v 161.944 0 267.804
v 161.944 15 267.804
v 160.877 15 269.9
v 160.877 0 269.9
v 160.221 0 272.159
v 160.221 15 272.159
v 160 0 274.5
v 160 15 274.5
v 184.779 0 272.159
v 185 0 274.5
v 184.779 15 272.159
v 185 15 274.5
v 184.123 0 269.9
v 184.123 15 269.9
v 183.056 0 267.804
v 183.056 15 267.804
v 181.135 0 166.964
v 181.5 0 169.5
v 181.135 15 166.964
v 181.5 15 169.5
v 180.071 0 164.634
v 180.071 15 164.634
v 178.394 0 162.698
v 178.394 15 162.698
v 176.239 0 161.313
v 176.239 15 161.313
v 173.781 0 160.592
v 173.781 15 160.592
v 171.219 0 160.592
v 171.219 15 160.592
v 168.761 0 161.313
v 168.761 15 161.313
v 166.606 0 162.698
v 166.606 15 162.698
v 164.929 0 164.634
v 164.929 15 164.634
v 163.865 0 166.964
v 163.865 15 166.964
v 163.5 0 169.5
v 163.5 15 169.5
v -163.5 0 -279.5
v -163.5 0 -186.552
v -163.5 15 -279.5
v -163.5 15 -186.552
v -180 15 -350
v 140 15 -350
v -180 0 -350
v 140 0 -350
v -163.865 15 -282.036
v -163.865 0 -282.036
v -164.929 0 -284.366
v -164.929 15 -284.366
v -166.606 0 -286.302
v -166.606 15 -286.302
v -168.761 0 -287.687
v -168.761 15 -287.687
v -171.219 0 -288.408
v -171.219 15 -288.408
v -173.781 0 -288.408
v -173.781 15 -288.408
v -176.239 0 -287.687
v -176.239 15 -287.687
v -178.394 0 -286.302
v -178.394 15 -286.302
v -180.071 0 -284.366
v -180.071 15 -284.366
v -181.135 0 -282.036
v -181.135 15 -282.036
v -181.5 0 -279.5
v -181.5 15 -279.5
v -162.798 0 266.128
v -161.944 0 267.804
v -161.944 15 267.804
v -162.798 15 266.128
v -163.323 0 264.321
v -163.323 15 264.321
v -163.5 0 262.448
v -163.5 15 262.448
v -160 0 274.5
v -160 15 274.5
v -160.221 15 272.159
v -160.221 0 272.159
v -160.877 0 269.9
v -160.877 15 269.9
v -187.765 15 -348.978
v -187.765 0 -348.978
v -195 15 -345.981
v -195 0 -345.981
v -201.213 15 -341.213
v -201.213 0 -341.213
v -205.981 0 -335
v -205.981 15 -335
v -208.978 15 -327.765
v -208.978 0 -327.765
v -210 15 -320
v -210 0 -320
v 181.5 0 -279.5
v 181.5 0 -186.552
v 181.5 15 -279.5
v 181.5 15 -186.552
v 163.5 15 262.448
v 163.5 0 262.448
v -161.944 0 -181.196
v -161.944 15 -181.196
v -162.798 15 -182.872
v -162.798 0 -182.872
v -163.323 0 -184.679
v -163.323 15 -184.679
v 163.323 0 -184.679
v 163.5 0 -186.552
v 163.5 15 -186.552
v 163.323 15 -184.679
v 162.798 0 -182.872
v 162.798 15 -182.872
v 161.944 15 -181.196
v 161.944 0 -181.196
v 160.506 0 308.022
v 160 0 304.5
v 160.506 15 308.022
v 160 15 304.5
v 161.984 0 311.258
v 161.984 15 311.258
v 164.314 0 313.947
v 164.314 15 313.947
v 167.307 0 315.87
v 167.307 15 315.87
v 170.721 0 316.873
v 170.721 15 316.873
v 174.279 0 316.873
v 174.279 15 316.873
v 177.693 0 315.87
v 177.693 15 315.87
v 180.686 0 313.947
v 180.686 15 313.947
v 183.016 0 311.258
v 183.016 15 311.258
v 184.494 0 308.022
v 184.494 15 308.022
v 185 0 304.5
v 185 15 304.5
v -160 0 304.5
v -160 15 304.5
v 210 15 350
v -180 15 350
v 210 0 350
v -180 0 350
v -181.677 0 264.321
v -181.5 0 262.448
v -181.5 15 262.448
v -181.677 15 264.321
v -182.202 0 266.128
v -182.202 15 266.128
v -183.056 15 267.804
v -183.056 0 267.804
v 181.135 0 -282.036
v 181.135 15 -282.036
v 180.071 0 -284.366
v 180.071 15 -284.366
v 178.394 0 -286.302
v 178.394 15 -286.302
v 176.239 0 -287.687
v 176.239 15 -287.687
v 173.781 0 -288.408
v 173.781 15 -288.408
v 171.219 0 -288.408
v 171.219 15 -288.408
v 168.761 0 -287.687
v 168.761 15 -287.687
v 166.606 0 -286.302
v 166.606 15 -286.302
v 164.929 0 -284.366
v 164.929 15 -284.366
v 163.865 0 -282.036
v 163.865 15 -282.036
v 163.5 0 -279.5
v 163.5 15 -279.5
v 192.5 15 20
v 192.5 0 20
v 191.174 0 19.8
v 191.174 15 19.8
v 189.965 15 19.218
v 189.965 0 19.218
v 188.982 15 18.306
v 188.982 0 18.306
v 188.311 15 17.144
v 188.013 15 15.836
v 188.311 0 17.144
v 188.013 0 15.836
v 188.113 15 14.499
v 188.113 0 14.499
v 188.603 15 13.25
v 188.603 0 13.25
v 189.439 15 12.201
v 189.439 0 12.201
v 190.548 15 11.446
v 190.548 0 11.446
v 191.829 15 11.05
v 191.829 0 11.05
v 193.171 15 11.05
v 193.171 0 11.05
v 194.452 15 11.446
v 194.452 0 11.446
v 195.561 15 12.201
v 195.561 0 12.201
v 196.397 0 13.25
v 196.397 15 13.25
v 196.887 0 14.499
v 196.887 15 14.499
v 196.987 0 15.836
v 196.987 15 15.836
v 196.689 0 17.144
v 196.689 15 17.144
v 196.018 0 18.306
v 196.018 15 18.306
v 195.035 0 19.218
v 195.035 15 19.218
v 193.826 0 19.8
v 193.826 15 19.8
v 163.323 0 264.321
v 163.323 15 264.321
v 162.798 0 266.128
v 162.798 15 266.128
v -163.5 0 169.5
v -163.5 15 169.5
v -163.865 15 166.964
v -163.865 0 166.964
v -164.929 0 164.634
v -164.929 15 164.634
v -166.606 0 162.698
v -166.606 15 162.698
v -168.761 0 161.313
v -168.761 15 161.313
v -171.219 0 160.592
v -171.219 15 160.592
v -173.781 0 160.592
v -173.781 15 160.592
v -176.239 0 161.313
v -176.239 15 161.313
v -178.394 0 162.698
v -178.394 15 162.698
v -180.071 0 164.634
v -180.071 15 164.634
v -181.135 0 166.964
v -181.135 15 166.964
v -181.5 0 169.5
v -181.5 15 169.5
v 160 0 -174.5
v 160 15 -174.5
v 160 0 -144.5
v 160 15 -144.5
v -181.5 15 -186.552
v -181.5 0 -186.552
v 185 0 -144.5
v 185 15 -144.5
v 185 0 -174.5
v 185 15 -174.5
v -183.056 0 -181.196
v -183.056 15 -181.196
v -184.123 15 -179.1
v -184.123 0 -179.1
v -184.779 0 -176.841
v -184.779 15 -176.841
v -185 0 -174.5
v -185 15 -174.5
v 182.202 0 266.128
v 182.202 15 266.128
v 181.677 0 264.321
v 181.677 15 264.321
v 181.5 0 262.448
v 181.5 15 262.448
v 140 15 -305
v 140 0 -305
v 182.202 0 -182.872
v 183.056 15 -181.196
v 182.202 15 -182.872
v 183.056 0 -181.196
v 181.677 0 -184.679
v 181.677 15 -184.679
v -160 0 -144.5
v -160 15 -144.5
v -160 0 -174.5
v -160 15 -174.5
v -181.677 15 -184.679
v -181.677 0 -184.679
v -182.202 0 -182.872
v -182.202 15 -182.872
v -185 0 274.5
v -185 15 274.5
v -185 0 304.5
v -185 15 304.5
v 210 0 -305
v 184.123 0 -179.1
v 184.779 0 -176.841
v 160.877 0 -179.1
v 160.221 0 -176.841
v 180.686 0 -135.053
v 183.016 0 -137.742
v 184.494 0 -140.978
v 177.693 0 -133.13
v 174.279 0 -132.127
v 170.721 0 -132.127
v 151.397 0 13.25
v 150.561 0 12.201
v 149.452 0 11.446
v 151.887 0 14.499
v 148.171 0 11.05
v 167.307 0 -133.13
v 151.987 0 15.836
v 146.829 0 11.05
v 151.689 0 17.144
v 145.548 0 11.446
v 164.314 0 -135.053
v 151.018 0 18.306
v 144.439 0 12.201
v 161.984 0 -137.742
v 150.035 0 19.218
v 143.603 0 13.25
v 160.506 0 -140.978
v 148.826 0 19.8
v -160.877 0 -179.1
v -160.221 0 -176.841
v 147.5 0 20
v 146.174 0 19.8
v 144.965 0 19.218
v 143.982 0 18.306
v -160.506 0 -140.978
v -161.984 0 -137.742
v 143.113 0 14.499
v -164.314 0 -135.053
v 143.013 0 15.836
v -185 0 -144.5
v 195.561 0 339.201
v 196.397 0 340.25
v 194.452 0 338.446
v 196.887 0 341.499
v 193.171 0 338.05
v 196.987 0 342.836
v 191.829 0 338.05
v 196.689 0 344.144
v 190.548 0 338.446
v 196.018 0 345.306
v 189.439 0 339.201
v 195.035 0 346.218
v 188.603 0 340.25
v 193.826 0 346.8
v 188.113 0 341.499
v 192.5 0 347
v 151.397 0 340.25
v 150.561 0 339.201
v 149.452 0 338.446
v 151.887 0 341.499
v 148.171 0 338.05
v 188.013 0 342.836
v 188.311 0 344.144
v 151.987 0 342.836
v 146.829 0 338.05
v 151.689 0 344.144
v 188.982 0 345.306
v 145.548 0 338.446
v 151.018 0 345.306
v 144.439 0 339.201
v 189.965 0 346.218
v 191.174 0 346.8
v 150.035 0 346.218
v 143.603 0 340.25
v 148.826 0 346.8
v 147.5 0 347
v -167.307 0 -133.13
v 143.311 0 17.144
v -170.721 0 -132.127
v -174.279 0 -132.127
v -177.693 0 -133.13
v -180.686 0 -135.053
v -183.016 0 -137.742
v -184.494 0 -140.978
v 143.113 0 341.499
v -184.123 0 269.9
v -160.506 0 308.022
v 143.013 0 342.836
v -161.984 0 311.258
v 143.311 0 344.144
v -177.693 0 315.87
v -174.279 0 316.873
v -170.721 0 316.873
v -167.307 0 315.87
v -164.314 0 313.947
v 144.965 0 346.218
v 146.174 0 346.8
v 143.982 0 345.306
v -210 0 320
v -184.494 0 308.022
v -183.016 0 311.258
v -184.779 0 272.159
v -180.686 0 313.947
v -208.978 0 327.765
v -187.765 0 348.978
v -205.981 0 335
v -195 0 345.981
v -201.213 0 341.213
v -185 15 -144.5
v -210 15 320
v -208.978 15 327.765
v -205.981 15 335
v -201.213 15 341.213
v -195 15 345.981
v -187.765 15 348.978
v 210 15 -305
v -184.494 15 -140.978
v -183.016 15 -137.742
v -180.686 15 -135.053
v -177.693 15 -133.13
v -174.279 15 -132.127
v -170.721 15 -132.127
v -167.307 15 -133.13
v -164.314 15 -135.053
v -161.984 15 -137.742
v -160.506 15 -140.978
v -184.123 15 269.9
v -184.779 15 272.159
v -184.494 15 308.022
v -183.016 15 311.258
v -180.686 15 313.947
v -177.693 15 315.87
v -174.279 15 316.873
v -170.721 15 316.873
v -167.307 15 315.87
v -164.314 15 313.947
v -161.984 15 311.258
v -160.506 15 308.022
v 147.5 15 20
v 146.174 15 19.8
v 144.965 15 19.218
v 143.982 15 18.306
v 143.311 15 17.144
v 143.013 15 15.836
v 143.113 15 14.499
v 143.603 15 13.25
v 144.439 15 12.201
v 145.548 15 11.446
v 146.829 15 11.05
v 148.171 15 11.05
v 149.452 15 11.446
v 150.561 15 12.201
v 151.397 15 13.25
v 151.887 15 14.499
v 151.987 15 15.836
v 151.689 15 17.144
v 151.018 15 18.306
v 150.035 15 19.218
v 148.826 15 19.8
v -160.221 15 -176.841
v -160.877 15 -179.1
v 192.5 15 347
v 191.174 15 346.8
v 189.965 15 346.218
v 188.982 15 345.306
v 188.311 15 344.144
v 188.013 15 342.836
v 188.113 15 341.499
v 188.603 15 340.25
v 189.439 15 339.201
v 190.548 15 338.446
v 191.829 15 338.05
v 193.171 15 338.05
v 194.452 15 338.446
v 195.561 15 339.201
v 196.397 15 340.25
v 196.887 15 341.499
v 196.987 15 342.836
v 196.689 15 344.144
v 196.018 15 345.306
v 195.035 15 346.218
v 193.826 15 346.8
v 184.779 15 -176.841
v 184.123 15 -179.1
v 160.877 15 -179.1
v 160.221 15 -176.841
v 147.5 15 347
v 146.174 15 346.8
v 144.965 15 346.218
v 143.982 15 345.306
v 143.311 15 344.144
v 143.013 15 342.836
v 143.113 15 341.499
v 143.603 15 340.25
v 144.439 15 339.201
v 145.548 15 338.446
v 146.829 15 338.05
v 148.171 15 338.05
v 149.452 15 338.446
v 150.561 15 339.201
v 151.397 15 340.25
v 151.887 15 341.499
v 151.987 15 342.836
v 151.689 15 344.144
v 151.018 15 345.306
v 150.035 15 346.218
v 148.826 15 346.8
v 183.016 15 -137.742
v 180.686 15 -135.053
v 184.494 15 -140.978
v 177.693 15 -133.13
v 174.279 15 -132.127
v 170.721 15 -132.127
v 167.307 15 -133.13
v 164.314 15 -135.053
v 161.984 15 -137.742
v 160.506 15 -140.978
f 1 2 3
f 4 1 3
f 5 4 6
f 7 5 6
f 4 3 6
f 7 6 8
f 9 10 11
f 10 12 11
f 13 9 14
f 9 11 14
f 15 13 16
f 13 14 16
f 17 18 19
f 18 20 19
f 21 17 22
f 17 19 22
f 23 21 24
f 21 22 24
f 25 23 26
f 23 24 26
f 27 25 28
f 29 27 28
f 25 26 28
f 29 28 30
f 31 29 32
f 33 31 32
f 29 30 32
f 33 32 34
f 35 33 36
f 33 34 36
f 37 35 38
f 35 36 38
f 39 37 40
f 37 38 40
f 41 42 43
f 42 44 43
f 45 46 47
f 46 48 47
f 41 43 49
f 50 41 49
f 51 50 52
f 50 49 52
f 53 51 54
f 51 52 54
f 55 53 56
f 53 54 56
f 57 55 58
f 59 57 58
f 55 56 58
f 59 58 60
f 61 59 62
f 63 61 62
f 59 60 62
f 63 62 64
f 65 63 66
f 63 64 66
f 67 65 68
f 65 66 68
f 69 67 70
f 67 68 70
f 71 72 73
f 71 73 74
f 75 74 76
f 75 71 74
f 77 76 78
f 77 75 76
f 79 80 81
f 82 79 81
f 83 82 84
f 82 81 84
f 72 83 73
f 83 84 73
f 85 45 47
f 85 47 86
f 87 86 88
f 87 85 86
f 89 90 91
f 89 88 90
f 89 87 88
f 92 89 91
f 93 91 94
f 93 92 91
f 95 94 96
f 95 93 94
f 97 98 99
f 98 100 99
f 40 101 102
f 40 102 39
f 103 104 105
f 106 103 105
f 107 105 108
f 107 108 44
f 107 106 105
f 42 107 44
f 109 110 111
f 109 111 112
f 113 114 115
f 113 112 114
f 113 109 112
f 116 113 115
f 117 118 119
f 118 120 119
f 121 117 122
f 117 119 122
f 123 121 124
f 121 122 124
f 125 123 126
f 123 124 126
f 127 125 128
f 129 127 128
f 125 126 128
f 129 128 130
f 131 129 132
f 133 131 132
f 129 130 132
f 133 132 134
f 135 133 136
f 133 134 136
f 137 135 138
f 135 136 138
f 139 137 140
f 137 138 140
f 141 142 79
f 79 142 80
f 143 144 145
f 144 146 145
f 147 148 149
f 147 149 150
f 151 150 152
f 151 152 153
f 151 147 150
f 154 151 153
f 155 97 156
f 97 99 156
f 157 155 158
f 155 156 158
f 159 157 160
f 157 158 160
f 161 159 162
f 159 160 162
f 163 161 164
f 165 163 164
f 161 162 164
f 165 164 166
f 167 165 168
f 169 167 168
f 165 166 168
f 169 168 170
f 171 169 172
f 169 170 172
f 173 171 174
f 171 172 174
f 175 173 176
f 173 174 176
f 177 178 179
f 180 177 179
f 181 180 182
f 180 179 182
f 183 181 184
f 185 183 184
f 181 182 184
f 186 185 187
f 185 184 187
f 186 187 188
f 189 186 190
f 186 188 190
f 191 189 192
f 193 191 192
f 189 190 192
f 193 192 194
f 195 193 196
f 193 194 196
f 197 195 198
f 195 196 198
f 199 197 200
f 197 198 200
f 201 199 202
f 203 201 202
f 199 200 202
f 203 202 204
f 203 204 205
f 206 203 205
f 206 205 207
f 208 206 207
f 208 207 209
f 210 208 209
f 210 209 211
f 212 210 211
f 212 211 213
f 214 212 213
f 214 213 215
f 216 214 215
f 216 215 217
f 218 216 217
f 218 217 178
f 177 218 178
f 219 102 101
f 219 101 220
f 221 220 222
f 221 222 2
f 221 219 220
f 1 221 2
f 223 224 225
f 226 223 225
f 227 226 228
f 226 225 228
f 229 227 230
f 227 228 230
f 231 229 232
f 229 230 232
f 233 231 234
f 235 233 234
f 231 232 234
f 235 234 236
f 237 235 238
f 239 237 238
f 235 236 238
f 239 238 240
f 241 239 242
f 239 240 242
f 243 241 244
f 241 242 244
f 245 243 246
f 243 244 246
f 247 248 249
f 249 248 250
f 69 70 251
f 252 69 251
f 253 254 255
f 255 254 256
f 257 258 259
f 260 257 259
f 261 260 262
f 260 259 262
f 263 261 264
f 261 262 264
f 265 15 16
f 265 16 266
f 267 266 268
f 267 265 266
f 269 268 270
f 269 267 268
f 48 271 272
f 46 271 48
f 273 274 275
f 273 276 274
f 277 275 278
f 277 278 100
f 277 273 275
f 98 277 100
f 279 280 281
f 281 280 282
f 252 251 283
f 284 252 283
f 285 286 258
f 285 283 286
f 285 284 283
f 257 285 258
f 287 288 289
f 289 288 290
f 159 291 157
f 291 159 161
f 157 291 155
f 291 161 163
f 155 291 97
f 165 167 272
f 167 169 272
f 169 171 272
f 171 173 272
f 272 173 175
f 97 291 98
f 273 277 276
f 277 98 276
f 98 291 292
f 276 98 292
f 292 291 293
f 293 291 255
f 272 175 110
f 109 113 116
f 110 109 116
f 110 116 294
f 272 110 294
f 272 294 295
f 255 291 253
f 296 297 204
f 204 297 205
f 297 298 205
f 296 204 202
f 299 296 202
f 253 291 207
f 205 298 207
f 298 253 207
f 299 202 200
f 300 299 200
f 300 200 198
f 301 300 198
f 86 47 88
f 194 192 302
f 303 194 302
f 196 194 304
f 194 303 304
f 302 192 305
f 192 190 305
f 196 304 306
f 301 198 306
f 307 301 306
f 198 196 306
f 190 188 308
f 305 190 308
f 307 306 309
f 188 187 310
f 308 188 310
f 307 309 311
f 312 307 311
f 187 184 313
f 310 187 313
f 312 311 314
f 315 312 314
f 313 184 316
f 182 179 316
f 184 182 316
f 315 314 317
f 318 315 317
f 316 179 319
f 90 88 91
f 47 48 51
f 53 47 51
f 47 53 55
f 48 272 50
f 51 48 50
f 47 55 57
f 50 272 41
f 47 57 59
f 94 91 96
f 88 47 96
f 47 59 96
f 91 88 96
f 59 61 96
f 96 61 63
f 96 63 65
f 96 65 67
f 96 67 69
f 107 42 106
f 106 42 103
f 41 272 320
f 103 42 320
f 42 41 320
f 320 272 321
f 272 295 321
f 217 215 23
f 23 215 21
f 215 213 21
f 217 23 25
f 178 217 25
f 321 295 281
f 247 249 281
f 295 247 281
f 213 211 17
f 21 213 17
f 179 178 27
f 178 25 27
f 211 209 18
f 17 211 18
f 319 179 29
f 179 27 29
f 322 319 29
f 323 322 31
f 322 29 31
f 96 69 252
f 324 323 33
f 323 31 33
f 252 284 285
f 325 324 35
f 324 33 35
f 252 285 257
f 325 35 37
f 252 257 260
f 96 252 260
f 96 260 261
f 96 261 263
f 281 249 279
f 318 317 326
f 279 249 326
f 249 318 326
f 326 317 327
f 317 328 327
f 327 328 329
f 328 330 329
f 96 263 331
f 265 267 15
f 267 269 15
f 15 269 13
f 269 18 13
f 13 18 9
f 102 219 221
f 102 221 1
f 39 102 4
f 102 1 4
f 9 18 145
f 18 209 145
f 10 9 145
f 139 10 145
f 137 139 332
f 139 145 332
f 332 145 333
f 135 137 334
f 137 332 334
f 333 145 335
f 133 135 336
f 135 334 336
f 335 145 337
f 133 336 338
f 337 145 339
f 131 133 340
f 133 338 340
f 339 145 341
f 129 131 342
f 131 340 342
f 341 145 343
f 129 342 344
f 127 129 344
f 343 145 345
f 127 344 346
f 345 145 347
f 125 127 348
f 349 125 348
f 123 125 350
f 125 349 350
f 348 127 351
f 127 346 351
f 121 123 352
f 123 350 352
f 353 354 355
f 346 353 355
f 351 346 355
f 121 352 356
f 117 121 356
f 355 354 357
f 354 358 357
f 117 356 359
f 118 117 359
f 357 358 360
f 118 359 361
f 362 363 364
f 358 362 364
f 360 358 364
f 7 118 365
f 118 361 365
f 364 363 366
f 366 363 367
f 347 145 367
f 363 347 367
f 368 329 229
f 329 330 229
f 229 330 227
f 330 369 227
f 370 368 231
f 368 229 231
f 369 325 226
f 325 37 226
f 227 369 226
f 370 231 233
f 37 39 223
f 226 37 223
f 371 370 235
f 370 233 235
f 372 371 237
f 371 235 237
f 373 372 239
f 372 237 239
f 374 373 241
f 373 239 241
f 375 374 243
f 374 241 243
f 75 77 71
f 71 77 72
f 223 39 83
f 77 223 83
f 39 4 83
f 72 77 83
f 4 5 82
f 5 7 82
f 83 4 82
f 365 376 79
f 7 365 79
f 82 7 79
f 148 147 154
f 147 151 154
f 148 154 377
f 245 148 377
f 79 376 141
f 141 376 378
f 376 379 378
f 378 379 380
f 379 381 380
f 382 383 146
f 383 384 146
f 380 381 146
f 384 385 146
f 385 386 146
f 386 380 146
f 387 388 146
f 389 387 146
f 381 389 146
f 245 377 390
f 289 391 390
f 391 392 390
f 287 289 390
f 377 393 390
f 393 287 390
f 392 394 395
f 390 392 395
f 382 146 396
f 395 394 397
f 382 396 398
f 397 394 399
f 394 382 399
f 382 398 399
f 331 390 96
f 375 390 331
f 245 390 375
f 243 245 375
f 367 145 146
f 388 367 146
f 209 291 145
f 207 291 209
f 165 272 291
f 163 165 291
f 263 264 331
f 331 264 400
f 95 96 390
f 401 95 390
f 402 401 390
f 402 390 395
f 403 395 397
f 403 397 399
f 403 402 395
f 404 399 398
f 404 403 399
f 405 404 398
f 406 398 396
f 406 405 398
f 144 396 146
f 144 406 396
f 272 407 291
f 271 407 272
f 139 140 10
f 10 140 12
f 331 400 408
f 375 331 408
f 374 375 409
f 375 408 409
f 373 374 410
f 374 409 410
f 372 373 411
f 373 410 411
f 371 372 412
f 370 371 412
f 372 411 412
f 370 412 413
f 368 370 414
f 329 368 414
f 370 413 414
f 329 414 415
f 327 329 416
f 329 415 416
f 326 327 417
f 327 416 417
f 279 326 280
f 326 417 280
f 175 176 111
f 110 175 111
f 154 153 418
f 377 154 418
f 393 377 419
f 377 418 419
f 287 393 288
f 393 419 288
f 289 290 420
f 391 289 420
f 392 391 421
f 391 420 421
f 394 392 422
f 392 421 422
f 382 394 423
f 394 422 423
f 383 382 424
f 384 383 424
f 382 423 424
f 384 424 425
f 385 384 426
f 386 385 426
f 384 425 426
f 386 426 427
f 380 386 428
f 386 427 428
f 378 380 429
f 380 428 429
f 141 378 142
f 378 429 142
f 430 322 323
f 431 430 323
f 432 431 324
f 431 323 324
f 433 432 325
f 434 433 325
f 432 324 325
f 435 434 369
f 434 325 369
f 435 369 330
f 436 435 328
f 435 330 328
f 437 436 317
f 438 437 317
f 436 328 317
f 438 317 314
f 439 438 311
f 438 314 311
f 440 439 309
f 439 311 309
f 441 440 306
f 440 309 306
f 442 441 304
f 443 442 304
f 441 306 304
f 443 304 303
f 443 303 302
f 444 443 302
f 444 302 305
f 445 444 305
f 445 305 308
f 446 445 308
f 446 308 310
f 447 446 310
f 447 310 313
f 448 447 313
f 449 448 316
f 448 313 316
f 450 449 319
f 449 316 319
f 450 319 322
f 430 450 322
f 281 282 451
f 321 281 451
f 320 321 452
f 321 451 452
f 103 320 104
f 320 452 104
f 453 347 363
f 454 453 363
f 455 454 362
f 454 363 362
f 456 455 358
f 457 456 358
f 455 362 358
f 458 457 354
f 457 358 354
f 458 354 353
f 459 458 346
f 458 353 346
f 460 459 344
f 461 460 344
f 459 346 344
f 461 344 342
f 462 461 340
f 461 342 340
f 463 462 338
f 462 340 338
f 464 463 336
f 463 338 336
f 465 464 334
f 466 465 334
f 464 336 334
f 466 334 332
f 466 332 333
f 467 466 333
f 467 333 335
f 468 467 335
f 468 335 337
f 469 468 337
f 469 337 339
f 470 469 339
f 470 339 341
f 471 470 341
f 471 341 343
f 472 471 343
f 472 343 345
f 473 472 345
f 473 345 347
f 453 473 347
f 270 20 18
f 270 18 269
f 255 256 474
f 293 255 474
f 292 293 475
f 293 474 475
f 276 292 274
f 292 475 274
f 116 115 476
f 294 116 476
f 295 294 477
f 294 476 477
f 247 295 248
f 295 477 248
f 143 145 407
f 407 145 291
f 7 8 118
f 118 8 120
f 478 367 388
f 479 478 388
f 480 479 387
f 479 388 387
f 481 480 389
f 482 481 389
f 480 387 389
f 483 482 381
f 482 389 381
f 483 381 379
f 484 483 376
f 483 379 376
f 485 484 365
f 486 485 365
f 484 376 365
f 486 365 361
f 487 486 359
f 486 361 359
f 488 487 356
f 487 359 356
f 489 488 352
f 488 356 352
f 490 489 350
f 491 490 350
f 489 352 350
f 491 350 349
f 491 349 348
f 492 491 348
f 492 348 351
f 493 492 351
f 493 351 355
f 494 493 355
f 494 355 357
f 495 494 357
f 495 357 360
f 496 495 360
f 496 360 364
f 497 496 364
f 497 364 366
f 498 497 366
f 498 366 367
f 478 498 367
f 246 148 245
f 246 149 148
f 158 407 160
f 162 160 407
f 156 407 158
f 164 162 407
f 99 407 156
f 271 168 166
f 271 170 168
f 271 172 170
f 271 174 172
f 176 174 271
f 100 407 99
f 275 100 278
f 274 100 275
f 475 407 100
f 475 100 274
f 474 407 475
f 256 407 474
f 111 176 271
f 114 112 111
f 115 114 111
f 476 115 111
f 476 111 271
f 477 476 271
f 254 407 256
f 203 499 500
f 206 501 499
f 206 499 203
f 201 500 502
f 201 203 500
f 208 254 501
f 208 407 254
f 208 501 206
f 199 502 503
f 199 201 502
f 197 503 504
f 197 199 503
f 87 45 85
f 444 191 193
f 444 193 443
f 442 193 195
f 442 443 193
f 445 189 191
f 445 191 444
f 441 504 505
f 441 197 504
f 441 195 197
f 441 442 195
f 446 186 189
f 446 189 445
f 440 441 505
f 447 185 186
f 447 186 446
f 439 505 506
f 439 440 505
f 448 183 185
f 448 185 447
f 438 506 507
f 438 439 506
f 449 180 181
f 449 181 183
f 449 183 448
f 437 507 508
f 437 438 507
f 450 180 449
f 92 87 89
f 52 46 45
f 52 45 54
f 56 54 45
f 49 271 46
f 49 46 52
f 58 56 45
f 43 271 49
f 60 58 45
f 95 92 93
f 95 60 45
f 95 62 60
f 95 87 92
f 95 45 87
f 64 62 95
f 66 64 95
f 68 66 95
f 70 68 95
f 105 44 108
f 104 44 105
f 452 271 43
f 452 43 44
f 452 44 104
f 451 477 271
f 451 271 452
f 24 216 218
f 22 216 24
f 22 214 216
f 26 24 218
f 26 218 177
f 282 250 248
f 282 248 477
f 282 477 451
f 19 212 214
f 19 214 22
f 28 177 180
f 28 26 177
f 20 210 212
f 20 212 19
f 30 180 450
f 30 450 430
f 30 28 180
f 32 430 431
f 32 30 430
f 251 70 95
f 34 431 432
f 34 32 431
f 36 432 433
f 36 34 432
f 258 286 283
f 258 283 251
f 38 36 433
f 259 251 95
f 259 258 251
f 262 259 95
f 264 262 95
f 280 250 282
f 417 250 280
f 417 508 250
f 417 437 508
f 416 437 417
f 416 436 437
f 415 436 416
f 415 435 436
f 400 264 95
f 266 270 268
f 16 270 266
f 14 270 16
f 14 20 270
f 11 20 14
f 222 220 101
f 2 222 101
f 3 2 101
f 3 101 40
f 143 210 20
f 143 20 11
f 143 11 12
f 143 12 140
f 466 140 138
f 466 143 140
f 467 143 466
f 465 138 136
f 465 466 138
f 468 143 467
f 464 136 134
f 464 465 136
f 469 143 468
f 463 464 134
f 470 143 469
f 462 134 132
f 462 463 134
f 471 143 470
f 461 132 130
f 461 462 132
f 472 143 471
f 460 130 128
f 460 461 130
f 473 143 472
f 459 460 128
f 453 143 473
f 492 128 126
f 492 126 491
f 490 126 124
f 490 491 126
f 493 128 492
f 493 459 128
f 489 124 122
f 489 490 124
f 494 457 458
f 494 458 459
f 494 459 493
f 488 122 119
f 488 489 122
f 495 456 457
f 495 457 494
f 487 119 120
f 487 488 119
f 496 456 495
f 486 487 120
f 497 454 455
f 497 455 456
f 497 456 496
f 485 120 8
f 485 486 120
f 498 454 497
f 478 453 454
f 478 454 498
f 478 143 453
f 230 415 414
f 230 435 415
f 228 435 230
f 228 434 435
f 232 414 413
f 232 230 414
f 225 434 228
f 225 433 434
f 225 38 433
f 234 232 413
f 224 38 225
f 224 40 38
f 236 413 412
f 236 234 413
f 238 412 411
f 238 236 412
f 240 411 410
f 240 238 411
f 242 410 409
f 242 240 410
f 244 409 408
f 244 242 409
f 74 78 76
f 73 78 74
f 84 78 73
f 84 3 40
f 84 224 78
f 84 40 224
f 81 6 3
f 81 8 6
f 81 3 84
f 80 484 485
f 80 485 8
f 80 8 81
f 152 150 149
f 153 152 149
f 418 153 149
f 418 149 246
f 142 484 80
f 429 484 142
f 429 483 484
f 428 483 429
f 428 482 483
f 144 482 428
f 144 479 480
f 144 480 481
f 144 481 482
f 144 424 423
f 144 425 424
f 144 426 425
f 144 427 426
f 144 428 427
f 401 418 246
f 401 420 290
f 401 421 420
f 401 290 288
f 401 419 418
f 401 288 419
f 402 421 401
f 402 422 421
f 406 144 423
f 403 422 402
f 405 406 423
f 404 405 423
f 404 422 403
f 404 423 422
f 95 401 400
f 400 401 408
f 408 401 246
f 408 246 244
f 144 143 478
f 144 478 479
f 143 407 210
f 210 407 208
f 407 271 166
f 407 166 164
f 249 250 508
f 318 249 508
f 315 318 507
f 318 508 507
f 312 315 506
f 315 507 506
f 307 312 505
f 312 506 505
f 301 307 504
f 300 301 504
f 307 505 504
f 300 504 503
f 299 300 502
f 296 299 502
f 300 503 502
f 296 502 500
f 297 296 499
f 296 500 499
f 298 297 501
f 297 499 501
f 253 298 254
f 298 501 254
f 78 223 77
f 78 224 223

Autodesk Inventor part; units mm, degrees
ref_plane "YZ Plane" through (0, 0, 0) normal (1, 0, 0) x (0, 1, 0)
ref_plane "XZ Plane" through (0, 0, 0) normal (0, 1, 0) x (-1, 0, 0)
ref_plane "XY Plane" through (0, 0, 0) normal (0, 0, 1) x (1, 0, 0)
sketch "Sketch1" plane through (0, 0, 0) normal (0, 1, 0) x (-1, 0, 0)
  line L0 (210, 350) -> (-210, 350)
  line L1 (-210, 350) -> (-210, -350)
  line L2 (-210, -350) -> (210, -350)
  line L3 (210, -350) -> (210, 350)
  point P0 (0, 0)
  point P1 (210, 0)
  point P2 (0, -350)
  dimension "d0" = 420
  dimension "d1" = 700
extrude "Extrusion1" add sketch "Sketch1" along normal blind 15
sketch "Sketch2" plane through (0, 15, 0) normal (0, 1, 0) x (1, 0, 0)
  line L0 (-172.5, -279.5) -> (172.5, -279.5) construction
  line L1 (172.5, -279.5) -> (172.5, 169.5) construction
  line L2 (172.5, 169.5) -> (-172.5, 169.5) construction
  line L3 (-172.5, 169.5) -> (-172.5, -279.5) construction
  line L4 (-210, 350) -> (-210, -350) construction
  line L5 (210, 350) -> (-210, 350) construction
  line L6 (-210, -350) -> (210, -350) construction
  line L7 (-172.5, 144.5) -> (-172.5, 279.5) construction
  line L8 (-163.5, 144.5) -> (-163.5, 279.5)
  line L9 (-181.5, 279.5) -> (-181.5, 144.5)
  arc A0 (-181.5, 144.5) -> (-163.5, 144.5) centre (-172.5, 144.5) ccw
  arc A1 (-163.5, 279.5) -> (-181.5, 279.5) centre (-172.5, 279.5) ccw
  line L10 (-172.5, -169.5) -> (-172.5, -304.5) construction
  line L11 (-163.5, -169.5) -> (-163.5, -304.5)
  line L12 (-181.5, -304.5) -> (-181.5, -169.5)
  arc A2 (-163.5, -169.5) -> (-181.5, -169.5) centre (-172.5, -169.5) ccw
  arc A3 (-181.5, -304.5) -> (-163.5, -304.5) centre (-172.5, -304.5) ccw
  line L13 (172.5, -169.5) -> (172.5, -304.5) construction
  line L14 (181.5, -169.5) -> (181.5, -304.5)
  line L15 (163.5, -304.5) -> (163.5, -169.5)
  arc A4 (181.5, -169.5) -> (163.5, -169.5) centre (172.5, -169.5) ccw
  arc A5 (163.5, -304.5) -> (181.5, -304.5) centre (172.5, -304.5) ccw
  line L16 (172.5, 144.5) -> (172.5, 279.5) construction
  line L17 (181.5, 144.5) -> (181.5, 279.5)
  line L18 (163.5, 279.5) -> (163.5, 144.5)
  arc A6 (163.5, 144.5) -> (181.5, 144.5) centre (172.5, 144.5) ccw
  arc A7 (181.5, 279.5) -> (163.5, 279.5) centre (172.5, 279.5) ccw
  point P0 (0, 0)
  point P1 (0, 169.5)
  point P2 (-172.5, 212)
  point P3 (-172.5, -237)
  point P4 (172.5, -237)
  point P5 (172.5, 212)
  dimension "d5" = 180.5
  dimension "d7" = 18
  dimension "d9" = 25
  dimension "d10" = 110
  dimension "d11" = 110
  dimension "d12" = 25
  dimension "d46" = 345
  dimension "d47" = 449
extrude "Extrusion2" cut sketch "Sketch2" against normal blind 15
fillet "Fillet1" radius 30 2 edges at (-210, 7.5, 350) (-210, 7.5, -350)
sketch "Sketch3" plane through (0, 15, 0) normal (0, 1, 0) x (1, 0, 0)
  line L0 (147.5, -342.5) -> (192.5, -342.5) construction
  line L1 (147.5, -15.5) -> (192.5, -15.5) construction
  line L2 (147.5, 342.5) -> (192.5, 342.5) construction
  line L3 (-180, -350) -> (210, -350) construction
  line L4 (210, -350) -> (210, 350) projected
  point P0 (0, 0)
  dimension "d17" = 45
  dimension "d18" = 327
  dimension "d19" = 358
  dimension "d48" = 147.5
  dimension "d49" = 15.5
hole "Hole1" at (147.5, 15, 342.5) at (192.5, 15, 342.5) at (147.5, 15, 15.5) at (192.5, 15, 15.5) at (147.5, 15, -342.5) at (192.5, 15, -342.5) direction (0, -1, 0) diameter 9 end through all
sketch "Sketch4" plane through (0, 15, 0) normal (0, 1, 0) x (1, 0, 0)
  line L0 (210, 305) -> (140, 305)
  line L1 (140, 305) -> (140, 350)
  line L2 (210, 350) -> (-180, 350) projected
  line L3 (210, -350) -> (210, 350) projected
  point P0 (0, 0)
  point P1 (210, 285)
  dimension "d29" = 45
  dimension "d50" = 140
extrude "Extrusion3" cut sketch "Sketch4" against normal through all
sketch "Sketch5" plane through (0, 15, 0) normal (0, 1, 0) x (1, 0, 0)
  arc A0 (-163.5, -169.5) -> (-181.5, -169.5) centre (-172.5, -169.5) ccw projected
  line L0 (-163.5, -169.5) -> (-163.5, -304.5) projected
  arc A1 (-181.5, -304.5) -> (-163.5, -304.5) centre (-172.5, -304.5) ccw projected
  line L1 (-181.5, -304.5) -> (-181.5, -169.5) projected
  arc A2 (181.5, -169.5) -> (163.5, -169.5) centre (172.5, -169.5) ccw projected
  line L2 (181.5, -169.5) -> (181.5, -304.5) projected
  arc A3 (163.5, -304.5) -> (181.5, -304.5) centre (172.5, -304.5) ccw projected
  line L3 (163.5, -304.5) -> (163.5, -169.5) projected
  line L4 (-181.5, 144.5) -> (-181.5, 279.5) projected
  arc A4 (-163.5, 279.5) -> (-181.5, 279.5) centre (-172.5, 279.5) ccw projected
  line L5 (-163.5, 279.5) -> (-163.5, 144.5) projected
  arc A5 (-181.5, 144.5) -> (-163.5, 144.5) centre (-172.5, 144.5) ccw projected
  line L6 (163.5, 144.5) -> (163.5, 279.5) projected
  arc A6 (181.5, 279.5) -> (163.5, 279.5) centre (172.5, 279.5) ccw projected
  line L7 (181.5, 279.5) -> (181.5, 144.5) projected
  arc A7 (163.5, 144.5) -> (181.5, 144.5) centre (172.5, 144.5) ccw projected
  circle A8 centre (147.5, -342.5) radius 4.5 projected
  circle A9 centre (192.5, -342.5) radius 4.5 projected
  circle A10 centre (147.5, -15.5) radius 4.5 projected
  circle A11 centre (192.5, -15.5) radius 4.5 projected
  line L8 (140, 350) -> (-180, 350) projected
  arc A12 (-180, 350) -> (-210, 320) centre (-180, 320) ccw projected
  line L9 (-210, 320) -> (-210, -320) projected
  arc A13 (-210, -320) -> (-180, -350) centre (-180, -320) ccw projected
  line L10 (-180, -350) -> (210, -350) projected
  line L11 (210, -350) -> (210, 305) projected
  line L12 (210, 305) -> (140, 305) projected
  line L13 (140, 305) -> (140, 350) projected
  line L14 (-172.5, -304.5) -> (-172.5, -274.5) construction
  line L15 (-160, -304.5) -> (-160, -274.5)
  line L16 (-185, -274.5) -> (-185, -304.5)
  arc A14 (-185, -304.5) -> (-160, -304.5) centre (-172.5, -304.5) ccw
  arc A15 (-160, -274.5) -> (-185, -274.5) centre (-172.5, -274.5) ccw
  line L17 (172.5, -304.5) -> (172.5, -274.5) construction
  line L18 (185, -304.5) -> (185, -274.5)
  line L19 (160, -274.5) -> (160, -304.5)
  arc A16 (160, -304.5) -> (185, -304.5) centre (172.5, -304.5) ccw
  arc A17 (185, -274.5) -> (160, -274.5) centre (172.5, -274.5) ccw
  line L20 (172.5, 144.5) -> (172.5, 174.5) construction
  line L21 (185, 144.5) -> (185, 174.5)
  line L22 (160, 174.5) -> (160, 144.5)
  arc A18 (160, 144.5) -> (185, 144.5) centre (172.5, 144.5) ccw
  arc A19 (185, 174.5) -> (160, 174.5) centre (172.5, 174.5) ccw
  line L23 (-172.5, 144.5) -> (-172.5, 174.5) construction
  line L24 (-160, 144.5) -> (-160, 174.5)
  line L25 (-185, 174.5) -> (-185, 144.5)
  arc A20 (-185, 144.5) -> (-160, 144.5) centre (-172.5, 144.5) ccw
  arc A21 (-160, 174.5) -> (-185, 174.5) centre (-172.5, 174.5) ccw
  point P0 (0, 0)
  point P1 (-172.5, -289.5)
  point P2 (172.5, -289.5)
  point P3 (172.5, 159.5)
  point P4 (-172.5, 159.5)
  point P5 (163.5, -265.8253)
  point P6 (181.5, -265.8253)
  point P7 (163.5, 183.1747)
  point P8 (181.5, 183.1747)
  point P9 (-181.5, 183.1747)
  point P10 (-163.5, 183.1747)
  point P11 (-181.5, -265.8253)
  point P12 (-163.5, -265.8253)
  dimension "d35" = 25
  dimension "d36" = 30
  dimension "d37" = 30
  dimension "d38" = 30
  dimension "d39" = 30
  dimension "d40" = 25
  dimension "d41" = 25
  dimension "d42" = 25
extrude "Extrusion4" cut sketch "Sketch5" against normal through all contours A15 L15 A14 L16 L1 A1 L0 | A17 L18 A16 L19 L3 A3 L2 | A5 L5 A21 L24 A20 L25 L4 | A7 L7 A19 L21 A18 L22 L6
fillet "Fillet3" radius 10 8 edges at (163.5, 7.5, 265.8253) (181.5, 7.5, 265.8253) (163.5, 7.5, -183.1747) (181.5, 7.5, -183.1747) (-181.5, 7.5, -183.1747) (-163.5, 7.5, -183.1747) (-181.5, 7.5, 265.8253) (-163.5, 7.5, 265.8253)
equation "\"d0\" = width"
equation "\"d1\" = length"
equation "\"d7\" = slotdi"
equation "\"d9\" = slotb"
equation "\"d10\" = slota"
equation "\"d11\" = slota"
equation "\"d12\" = slotb"
equation "\"d35\" = slotaldi"
equation "\"d36\" = slotalign"
equation "\"d37\" = slotalign"
equation "\"d38\" = slotalign"
equation "\"d39\" = slotalign"
equation "\"d40\" = slotaldi"
equation "\"d41\" = slotaldi"
equation "\"d42\" = slotaldi"
equation "\"slota\" = 110"
equation "\"slotb\" = 25"
equation "\"slotdi\" = 18"
equation "\"slotalign\" = 30"
equation "\"slotaldi\" = 25"
equation "\"width\" = 420"
equation "\"length\" = 700"
properties part number "palp-desk" material "Aluminum 6061"
